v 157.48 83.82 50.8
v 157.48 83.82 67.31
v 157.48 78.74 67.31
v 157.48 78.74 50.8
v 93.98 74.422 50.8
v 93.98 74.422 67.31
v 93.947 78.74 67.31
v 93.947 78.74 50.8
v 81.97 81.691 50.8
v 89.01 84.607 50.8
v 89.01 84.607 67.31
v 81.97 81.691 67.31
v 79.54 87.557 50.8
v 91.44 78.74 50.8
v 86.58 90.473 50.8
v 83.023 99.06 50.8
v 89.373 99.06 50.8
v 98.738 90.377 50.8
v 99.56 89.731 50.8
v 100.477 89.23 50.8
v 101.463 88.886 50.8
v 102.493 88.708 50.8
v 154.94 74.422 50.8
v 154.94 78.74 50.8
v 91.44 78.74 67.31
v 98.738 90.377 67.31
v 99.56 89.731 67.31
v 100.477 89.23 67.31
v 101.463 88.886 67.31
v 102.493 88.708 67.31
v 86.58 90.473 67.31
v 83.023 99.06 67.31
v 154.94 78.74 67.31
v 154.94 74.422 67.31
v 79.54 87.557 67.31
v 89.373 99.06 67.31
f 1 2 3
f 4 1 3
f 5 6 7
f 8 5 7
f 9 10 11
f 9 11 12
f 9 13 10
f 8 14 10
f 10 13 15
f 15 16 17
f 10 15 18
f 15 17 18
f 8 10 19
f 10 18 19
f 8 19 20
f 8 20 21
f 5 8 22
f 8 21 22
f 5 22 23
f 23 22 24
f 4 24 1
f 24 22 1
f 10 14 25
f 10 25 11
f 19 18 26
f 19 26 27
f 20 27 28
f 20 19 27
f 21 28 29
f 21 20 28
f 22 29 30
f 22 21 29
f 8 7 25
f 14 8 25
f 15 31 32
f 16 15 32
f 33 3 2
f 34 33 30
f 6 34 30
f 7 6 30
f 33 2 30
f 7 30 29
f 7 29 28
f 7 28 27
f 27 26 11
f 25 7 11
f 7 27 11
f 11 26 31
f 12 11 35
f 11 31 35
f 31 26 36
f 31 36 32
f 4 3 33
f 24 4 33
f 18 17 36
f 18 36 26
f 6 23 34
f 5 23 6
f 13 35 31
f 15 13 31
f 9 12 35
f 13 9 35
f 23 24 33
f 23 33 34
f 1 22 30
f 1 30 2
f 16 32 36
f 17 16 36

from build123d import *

# Parameters (mm, degrees)
SKETCH1_W      = 203.2
SKETCH1_H      = 101.6
EXTRUDE1_DEPTH = 50.8
EXTRUDE2_DEPTH = 16.51
SKETCH22_W     = 203.2
SKETCH22_H     = 50.8
EXTRUDE3_DEPTH = 12700


with BuildPart() as part:
    # Sketch1 → Extrude1 (new body)
    with BuildSketch(Plane.XY):
        with Locations((101.6, 50.8)):
            Rectangle(SKETCH1_W, SKETCH1_H)
    extrude(amount=EXTRUDE1_DEPTH)

    # Sketch20 → Extrude2 (add)
    with BuildSketch(Plane.XY.offset(50.8)):
        with BuildLine():
            ThreePointArc((98.73765298, 90.37654578), (100.476619995, 89.229944151), (102.493050685, 88.707728828))
            Line((102.493050685, 88.707728828), (157.48, 83.82))
            Line((157.48, 83.82), (157.48, 78.74))
            Line((157.48, 78.74), (154.94, 78.74))
            Line((154.94, 78.74), (154.94, 74.422))
            Line((154.94, 74.422), (93.98, 74.422))
            Line((93.98, 74.422), (93.947422963, 78.74))
            Line((93.947422963, 78.74), (91.44, 78.74))
            Line((91.44, 78.74), (89.009960204, 84.606635031))
            Line((89.009960204, 84.606635031), (81.969998167, 81.690587277))
            Line((81.969998167, 81.690587277), (79.539958371, 87.557222308))
            Line((79.539958371, 87.557222308), (86.579920409, 90.473270063))
            Line((86.579920409, 90.473270063), (83.023180413, 99.06))
            Line((83.023180413, 99.06), (89.373180413, 99.06))
            Line((89.373180413, 99.06), (98.73765298, 90.37654578))
        make_face()
    extrude(amount=EXTRUDE2_DEPTH)

    # Sketch22 → Extrude3 (cut)
    with BuildSketch(Plane(origin=(0, 101.6, 0), x_dir=(1, 0, 0), z_dir=(0, 1, 0))):
        with Locations((101.6, -25.4)):
            Rectangle(SKETCH22_W, SKETCH22_H)
    extrude(amount=-EXTRUDE3_DEPTH, mode=Mode.SUBTRACT)


solid = part.part
